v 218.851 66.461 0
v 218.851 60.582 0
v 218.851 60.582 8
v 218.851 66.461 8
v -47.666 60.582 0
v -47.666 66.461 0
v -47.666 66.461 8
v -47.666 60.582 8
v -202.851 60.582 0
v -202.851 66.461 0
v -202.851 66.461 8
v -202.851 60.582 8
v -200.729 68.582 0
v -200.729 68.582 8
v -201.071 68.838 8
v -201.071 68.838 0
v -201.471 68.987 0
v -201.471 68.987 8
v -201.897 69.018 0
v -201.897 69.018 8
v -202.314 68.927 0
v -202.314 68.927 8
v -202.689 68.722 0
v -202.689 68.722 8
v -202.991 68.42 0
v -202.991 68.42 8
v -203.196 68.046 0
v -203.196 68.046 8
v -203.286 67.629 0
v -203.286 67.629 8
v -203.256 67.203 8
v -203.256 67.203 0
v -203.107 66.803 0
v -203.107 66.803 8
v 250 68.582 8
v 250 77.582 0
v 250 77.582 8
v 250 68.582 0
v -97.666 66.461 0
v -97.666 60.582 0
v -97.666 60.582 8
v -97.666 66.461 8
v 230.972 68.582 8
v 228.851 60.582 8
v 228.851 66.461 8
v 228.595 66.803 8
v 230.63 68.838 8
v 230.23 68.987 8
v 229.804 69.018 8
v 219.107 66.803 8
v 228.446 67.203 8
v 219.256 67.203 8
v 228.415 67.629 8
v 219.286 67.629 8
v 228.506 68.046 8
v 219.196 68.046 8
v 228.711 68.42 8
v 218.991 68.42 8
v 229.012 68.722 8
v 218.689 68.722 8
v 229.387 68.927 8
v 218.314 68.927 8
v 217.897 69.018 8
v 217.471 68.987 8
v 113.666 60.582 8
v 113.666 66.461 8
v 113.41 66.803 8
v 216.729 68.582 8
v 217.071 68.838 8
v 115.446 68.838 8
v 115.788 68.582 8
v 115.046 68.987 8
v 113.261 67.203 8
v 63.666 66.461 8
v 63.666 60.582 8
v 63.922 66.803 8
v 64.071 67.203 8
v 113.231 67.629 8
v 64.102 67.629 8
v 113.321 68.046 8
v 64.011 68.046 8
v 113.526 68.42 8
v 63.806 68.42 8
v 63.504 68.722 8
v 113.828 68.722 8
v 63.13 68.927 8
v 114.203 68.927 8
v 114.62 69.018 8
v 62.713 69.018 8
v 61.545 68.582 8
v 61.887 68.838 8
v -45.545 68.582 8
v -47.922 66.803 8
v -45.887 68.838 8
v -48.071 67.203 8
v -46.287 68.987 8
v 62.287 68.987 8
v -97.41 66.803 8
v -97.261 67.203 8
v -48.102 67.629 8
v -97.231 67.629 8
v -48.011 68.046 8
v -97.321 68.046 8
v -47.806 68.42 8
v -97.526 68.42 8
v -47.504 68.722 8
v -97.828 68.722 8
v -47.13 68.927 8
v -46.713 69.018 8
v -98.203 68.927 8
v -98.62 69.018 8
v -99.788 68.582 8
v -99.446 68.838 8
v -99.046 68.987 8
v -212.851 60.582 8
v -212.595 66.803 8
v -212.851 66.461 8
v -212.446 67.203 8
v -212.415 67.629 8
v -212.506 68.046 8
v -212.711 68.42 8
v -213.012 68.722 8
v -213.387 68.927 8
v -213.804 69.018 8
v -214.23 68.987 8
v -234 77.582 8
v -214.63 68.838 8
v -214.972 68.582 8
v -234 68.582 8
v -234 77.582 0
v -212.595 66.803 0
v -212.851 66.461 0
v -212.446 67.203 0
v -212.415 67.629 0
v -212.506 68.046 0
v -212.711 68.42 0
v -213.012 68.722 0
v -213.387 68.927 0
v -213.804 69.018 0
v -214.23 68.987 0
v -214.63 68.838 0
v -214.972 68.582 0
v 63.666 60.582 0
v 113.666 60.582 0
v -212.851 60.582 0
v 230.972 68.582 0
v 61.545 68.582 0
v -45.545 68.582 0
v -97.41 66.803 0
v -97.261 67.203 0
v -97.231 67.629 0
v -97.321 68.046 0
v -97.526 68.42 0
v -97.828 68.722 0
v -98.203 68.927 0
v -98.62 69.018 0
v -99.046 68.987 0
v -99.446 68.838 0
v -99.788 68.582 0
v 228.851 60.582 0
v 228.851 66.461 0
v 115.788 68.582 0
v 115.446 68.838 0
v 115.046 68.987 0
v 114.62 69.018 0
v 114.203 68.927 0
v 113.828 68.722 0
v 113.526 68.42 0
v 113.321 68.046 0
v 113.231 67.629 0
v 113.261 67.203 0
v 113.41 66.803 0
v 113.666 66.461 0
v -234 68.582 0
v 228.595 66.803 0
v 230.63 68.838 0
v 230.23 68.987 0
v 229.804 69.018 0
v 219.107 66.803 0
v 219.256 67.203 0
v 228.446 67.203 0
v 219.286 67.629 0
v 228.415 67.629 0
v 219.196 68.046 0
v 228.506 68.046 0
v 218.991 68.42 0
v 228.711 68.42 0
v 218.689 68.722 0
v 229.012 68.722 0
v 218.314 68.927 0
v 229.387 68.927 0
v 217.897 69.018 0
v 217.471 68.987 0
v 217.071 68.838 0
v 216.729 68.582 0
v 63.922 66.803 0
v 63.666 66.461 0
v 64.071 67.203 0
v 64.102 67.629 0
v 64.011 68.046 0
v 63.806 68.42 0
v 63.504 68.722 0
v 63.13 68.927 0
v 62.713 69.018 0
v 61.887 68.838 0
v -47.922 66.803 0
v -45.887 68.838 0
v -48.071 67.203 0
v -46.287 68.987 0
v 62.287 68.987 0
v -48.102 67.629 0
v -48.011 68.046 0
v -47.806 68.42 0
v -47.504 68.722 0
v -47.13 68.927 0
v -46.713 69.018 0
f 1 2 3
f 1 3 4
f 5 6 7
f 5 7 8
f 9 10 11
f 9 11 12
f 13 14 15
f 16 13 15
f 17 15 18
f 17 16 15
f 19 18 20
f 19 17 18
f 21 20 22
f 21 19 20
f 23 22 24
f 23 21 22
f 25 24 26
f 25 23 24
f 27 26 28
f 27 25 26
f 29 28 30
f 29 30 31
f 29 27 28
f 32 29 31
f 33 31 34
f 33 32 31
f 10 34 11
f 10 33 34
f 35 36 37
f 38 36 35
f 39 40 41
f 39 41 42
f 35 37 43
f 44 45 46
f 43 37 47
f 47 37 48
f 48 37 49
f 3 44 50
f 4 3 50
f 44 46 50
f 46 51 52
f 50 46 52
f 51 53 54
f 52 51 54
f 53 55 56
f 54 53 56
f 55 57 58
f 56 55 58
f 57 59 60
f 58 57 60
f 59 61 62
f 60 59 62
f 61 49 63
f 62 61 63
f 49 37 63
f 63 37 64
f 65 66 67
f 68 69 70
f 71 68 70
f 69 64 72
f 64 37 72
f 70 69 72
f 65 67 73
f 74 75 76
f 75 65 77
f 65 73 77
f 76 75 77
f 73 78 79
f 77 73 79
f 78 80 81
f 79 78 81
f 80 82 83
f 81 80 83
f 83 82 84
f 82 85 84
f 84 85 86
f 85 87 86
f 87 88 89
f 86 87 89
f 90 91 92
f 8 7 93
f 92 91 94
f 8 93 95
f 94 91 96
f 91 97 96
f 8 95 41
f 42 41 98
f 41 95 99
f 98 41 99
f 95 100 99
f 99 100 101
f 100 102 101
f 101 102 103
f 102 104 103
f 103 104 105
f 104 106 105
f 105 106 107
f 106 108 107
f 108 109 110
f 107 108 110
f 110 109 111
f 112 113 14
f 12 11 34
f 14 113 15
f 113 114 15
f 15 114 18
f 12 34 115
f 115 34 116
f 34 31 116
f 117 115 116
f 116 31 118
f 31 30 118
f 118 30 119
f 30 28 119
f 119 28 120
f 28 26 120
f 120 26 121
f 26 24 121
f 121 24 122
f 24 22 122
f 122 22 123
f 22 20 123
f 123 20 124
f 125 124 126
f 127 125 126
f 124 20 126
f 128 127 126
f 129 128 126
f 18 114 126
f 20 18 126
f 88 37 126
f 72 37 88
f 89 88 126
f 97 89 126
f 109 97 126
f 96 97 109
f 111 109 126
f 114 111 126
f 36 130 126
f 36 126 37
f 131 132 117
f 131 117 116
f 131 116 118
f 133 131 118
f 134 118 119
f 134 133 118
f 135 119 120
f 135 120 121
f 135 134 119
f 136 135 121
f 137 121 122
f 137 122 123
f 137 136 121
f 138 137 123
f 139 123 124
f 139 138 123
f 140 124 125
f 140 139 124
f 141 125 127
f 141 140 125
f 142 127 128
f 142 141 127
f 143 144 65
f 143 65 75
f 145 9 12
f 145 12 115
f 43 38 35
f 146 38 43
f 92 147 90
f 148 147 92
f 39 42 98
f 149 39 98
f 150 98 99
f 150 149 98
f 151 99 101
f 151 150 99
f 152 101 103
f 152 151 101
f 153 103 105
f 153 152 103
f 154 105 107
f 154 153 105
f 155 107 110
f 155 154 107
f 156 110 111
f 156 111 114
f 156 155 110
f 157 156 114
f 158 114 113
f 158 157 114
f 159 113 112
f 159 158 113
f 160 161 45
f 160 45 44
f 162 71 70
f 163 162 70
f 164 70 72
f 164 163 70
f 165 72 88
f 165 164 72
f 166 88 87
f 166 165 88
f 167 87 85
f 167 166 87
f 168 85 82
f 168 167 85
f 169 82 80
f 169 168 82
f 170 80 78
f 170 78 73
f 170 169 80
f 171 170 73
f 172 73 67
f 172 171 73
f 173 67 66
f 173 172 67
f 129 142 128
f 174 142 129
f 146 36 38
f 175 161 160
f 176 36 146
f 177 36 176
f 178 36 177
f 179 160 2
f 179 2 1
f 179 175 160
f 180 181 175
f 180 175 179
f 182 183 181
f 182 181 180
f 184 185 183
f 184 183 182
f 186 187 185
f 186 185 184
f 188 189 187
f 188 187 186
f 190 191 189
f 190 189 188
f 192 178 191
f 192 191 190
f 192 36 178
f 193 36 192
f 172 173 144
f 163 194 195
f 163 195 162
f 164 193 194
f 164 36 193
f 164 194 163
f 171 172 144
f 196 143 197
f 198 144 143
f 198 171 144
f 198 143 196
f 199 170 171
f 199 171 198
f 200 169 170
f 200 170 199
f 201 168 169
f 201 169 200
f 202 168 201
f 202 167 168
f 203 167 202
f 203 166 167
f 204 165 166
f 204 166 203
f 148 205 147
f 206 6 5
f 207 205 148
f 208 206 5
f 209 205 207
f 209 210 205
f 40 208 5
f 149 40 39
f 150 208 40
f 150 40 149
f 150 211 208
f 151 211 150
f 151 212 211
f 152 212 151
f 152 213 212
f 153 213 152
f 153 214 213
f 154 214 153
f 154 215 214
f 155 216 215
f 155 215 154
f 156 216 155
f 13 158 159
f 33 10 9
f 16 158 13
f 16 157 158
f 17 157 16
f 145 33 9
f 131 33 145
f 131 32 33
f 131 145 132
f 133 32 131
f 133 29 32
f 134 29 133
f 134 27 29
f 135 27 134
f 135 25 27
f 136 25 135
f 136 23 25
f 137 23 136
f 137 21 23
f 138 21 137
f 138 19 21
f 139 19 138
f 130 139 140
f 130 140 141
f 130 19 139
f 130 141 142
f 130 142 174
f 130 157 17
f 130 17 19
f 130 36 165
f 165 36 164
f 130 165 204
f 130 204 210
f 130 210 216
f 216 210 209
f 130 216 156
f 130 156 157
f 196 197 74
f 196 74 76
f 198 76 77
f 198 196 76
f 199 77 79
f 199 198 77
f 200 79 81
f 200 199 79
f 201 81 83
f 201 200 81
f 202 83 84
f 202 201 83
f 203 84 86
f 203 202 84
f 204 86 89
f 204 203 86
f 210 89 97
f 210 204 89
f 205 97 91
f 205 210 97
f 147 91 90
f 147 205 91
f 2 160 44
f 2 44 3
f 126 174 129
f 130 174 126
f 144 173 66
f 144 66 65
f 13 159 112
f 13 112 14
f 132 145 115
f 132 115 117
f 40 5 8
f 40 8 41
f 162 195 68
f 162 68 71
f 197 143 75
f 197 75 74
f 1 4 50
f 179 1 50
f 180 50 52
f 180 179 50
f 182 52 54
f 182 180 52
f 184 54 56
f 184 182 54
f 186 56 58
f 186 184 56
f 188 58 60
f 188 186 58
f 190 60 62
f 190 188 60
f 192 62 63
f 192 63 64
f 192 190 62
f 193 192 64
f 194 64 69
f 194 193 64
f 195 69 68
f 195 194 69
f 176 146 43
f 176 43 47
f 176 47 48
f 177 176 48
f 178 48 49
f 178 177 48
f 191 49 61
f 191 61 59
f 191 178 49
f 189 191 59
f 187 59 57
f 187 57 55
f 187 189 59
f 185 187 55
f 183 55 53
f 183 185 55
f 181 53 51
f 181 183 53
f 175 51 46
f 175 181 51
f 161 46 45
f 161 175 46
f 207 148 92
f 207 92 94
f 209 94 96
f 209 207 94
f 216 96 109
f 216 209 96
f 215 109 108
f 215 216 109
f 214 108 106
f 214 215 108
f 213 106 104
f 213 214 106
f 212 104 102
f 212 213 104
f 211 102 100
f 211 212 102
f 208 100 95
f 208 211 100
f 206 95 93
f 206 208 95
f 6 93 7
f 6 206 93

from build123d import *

# Parameters (mm, degrees)
BOSS_EXTRU_1_DEPTH = 8


with BuildPart() as part:
    # Esquisse2 → Boss.-Extru.1 (new body)
    with BuildSketch(Plane.XY):
        with BuildLine():
            Line((-234, 77.582220472), (250, 77.582220472))
            Line((250, 77.582220472), (250, 68.582220472))
            Line((250, 68.582220472), (230.972064578, 68.582220472))
            ThreePointArc((230.972064578, 68.582220472), (228.850744234, 68.582220472), (228.850744234, 66.460900128))
            Line((228.850744234, 66.460900128), (228.850744234, 60.582220472))
            Line((228.850744234, 60.582220472), (218.850744234, 60.582220472))
            Line((218.850744234, 60.582220472), (218.850744234, 66.460900128))
            ThreePointArc((218.850744234, 66.460900128), (218.850744234, 68.582220472), (216.729423891, 68.582220472))
            Line((216.729423891, 68.582220472), (115.787517246, 68.582220472))
            ThreePointArc((115.787517246, 68.582220472), (113.666196902, 68.582220472), (113.666196902, 66.460900128))
            Line((113.666196902, 66.460900128), (113.666196902, 60.582220472))
            Line((113.666196902, 60.582220472), (63.666196902, 60.582220472))
            Line((63.666196902, 60.582220472), (63.666196902, 66.460900128))
            ThreePointArc((63.666196902, 66.460900128), (63.666196902, 68.582220472), (61.544876559, 68.582220472))
            Line((61.544876559, 68.582220472), (-45.544876559, 68.582220472))
            ThreePointArc((-45.544876559, 68.582220472), (-47.666196902, 68.582220472), (-47.666196902, 66.460900128))
            Line((-47.666196902, 66.460900128), (-47.666196902, 60.582220472))
            Line((-47.666196902, 60.582220472), (-97.666196902, 60.582220472))
            Line((-97.666196902, 60.582220472), (-97.666196902, 66.460900128))
            ThreePointArc((-97.666196902, 66.460900128), (-97.666196902, 68.582220472), (-99.787517246, 68.582220472))
            Line((-99.787517246, 68.582220472), (-200.729423891, 68.582220472))
            ThreePointArc((-200.729423891, 68.582220472), (-202.850744234, 68.582220472), (-202.850744234, 66.460900128))
            Line((-202.850744234, 66.460900128), (-202.850744234, 60.582220472))
            Line((-202.850744234, 60.582220472), (-212.850744234, 60.582220472))
            Line((-212.850744234, 60.582220472), (-212.850744234, 66.460900128))
            ThreePointArc((-212.850744234, 66.460900128), (-212.850744234, 68.582220472), (-214.972064578, 68.582220472))
            Line((-214.972064578, 68.582220472), (-234, 68.582220472))
            Line((-234, 68.582220472), (-234, 77.582220472))
        make_face()
    extrude(amount=BOSS_EXTRU_1_DEPTH)


solid = part.part
